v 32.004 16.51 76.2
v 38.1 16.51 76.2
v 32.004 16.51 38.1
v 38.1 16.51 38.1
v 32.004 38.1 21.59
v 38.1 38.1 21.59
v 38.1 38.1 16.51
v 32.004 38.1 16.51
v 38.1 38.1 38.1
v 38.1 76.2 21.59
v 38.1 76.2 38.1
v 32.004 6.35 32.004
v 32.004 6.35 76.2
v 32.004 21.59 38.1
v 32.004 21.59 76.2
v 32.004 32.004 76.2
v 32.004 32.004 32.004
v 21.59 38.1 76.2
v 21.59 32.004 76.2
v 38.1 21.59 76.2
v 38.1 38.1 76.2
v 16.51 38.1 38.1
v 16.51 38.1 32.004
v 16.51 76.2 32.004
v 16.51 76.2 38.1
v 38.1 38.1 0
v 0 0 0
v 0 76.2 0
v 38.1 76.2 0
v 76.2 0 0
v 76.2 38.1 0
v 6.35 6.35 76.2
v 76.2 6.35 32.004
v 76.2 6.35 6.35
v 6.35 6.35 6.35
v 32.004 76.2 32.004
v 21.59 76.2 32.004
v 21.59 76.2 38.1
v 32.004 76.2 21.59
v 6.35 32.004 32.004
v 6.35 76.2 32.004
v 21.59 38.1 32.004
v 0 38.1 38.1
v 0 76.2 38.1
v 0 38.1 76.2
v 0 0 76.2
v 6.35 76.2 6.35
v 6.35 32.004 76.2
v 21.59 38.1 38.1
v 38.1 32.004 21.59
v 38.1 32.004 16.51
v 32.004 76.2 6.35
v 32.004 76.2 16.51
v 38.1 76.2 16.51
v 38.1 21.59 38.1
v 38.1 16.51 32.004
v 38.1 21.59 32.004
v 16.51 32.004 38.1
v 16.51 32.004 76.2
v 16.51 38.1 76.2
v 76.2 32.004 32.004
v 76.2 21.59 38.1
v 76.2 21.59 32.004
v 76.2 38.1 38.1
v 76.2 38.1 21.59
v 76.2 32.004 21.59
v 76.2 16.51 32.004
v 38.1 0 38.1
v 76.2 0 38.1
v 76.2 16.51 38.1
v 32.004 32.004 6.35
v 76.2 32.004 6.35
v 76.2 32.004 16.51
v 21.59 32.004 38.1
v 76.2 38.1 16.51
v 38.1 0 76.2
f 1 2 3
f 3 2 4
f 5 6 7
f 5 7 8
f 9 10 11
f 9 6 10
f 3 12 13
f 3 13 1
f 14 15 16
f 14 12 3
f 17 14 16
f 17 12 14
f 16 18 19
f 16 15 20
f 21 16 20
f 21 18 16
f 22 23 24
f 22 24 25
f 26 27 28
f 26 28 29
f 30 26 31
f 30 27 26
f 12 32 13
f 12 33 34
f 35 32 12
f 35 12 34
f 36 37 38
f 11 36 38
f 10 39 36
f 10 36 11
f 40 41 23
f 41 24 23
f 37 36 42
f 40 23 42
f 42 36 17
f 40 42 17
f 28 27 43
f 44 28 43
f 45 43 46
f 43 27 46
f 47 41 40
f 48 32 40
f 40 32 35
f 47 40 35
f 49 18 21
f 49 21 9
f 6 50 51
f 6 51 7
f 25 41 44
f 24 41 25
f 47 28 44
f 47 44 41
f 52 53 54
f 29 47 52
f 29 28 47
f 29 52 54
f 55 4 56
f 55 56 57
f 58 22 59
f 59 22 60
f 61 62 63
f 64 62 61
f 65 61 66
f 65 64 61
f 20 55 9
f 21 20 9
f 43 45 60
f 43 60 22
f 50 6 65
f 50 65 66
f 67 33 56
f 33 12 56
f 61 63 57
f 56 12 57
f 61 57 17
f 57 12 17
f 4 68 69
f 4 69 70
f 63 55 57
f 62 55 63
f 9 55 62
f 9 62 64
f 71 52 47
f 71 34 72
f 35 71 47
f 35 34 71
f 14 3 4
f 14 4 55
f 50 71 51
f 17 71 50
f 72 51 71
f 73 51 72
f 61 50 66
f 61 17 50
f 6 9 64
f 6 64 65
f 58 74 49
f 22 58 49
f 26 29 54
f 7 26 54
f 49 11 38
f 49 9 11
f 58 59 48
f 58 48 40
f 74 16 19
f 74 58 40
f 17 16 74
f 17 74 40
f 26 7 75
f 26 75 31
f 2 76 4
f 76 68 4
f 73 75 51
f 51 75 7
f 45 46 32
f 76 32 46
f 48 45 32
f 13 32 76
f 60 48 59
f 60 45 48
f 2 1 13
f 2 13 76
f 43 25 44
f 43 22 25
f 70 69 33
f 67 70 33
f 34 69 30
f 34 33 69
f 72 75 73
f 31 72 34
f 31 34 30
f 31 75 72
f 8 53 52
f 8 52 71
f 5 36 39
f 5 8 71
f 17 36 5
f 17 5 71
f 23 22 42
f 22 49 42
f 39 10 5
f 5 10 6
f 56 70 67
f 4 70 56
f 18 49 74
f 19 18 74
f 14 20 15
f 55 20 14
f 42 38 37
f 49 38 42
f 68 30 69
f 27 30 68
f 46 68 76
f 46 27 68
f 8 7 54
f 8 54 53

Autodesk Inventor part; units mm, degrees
ref_plane "YZ Plane" through (0, 0, 0) normal (1, 0, 0) x (0, 1, 0)
ref_plane "XZ Plane" through (0, 0, 0) normal (0, 1, 0) x (-1, 0, 0)
ref_plane "XY Plane" through (0, 0, 0) normal (0, 0, 1) x (1, 0, 0)
sketch "Sketch1" plane through (0, 0, 0) normal (0, 0, 1) x (1, 0, 0)
  line L0 (0, 0) -> (38.1, 0)
  line L1 (38.1, 0) -> (38.1, 38.1)
  line L2 (38.1, 38.1) -> (0, 38.1)
  line L3 (0, 38.1) -> (0, 0)
  dimension "d0" = 38.1
  dimension "d1" = 38.1
extrude "Extrusion1" add sketch "Sketch1" along normal blind 38.1
sketch "Sketch2" plane through (0, 0, 38.1) normal (0, 0, 1) x (1, 0, 0)
  line L0 (6.35, 6.35) -> (32.004, 6.35)
  line L1 (32.004, 6.35) -> (32.004, 32.004)
  line L2 (32.004, 32.004) -> (6.35, 32.004)
  line L3 (6.35, 32.004) -> (6.35, 6.35)
  line L4 (38.1, 0) -> (38.1, 38.1) projected
  line L5 (0, 0) -> (38.1, 0)
  line L6 (38.1, 0) -> (38.1, 38.1)
  line L7 (38.1, 38.1) -> (0, 38.1)
  line L8 (0, 38.1) -> (0, 0)
  dimension "d4" = 25.654
  dimension "d5" = 25.654
extrude "Extrusion2" cut sketch "Sketch2" against normal blind 31.75 contours L3 L2 L1 L0
sketch "Sketch3" plane through (38.1, 0, 0) normal (1, 0, 0) x (0, 0, -1)
  point P0 (0, 0)
sketch "Sketch5" plane through (0, 0, 38.1) normal (0, 0, 1) x (1, 0, 0)
  line L0 (6.35, 6.35) -> (6.35, 32.004) projected
  line L1 (6.35, 6.35) -> (32.004, 6.35)
  line L2 (32.004, 6.35) -> (32.004, 32.004)
  line L3 (32.004, 32.004) -> (6.35, 32.004)
  line L4 (6.35, 32.004) -> (6.35, 6.35)
  line L5 (0, 0) -> (38.1, 0) projected
  line L6 (0, 0) -> (38.1, 0)
  line L7 (38.1, 0) -> (38.1, 38.1)
  line L8 (38.1, 38.1) -> (0, 38.1)
  line L9 (0, 38.1) -> (0, 0)
extrude "Extrusion4" add sketch "Sketch5" along normal blind 38.1
sketch "Sketch7" plane through (38.1, 0, 0) normal (1, 0, 0) x (0, 0, -1)
  line L0 (0, 0) -> (-76.2, 0) projected
  line L1 (0, 0) -> (-38.1, 0)
  line L2 (-38.1, 0) -> (-38.1, 38.1)
  line L3 (-38.1, 38.1) -> (0, 38.1)
  line L4 (0, 38.1) -> (0, 0)
  line L5 (-76.2, 6.35) -> (-6.35, 6.35) projected
  line L6 (-6.35, 6.35) -> (-32.004, 6.35)
  line L7 (-32.004, 6.35) -> (-32.004, 32.004)
  line L8 (-32.004, 32.004) -> (-6.35, 32.004)
  line L9 (-6.35, 32.004) -> (-6.35, 6.35)
  dimension "d16" = 38.1
  dimension "d17" = 38.1
  dimension "d20" = 25.654
  dimension "d21" = 25.654
extrude "Extrusion6" add sketch "Sketch7" along normal blind 38.1
sketch "Sketch9" plane through (38.1, 6.35, 6.35) normal (1, 0, 0) x (0, 0, -1)
  line L0 (-25.654, 0) -> (-25.654, 25.654) projected
  line L1 (0, 0) -> (0, 25.654) projected
  line L2 (-25.654, 0) -> (0, 0)
  line L3 (0, 0) -> (0, 25.654)
  line L4 (0, 25.654) -> (-25.654, 25.654)
  line L5 (-25.654, 25.654) -> (-25.654, 0)
  point P0 (6.35, -6.35)
extrude "Extrusion7" cut sketch "Sketch9" against normal blind 31.75
sketch "Sketch10" plane through (0, 38.1, 76.2) normal (0, 1, 0) x (1, 0, 0)
  line L0 (76.2, 69.85) -> (6.35, 69.85) projected
  line L1 (6.35, 69.85) -> (32.004, 69.85)
  line L2 (32.004, 69.85) -> (32.004, 44.196)
  line L3 (32.004, 44.196) -> (6.35, 44.196)
  line L4 (6.35, 44.196) -> (6.35, 69.85)
  line L5 (38.1, 38.1) -> (38.1, 0) projected
  line L6 (0, 76.2) -> (0, 0) projected
  line L7 (38.1, 38.1) -> (0, 38.1)
  line L8 (0, 38.1) -> (0, 76.2)
  line L9 (0, 76.2) -> (38.1, 76.2)
  line L10 (38.1, 76.2) -> (38.1, 38.1)
  point P0 (0, 38.1)
  dimension "d26" = 25.654
  dimension "d27" = 25.654
extrude "Extrusion8" add sketch "Sketch10" along normal blind 38.1
sketch "Sketch11" plane through (6.35, 38.1, 6.35) normal (0, 1, 0) x (1, 0, 0)
  line L0 (0, -25.654) -> (25.654, -25.654) projected
  line L1 (25.654, -25.654) -> (0, -25.654)
  line L2 (0, -25.654) -> (0, 0)
  line L3 (0, 0) -> (25.654, 0)
  line L4 (25.654, 0) -> (25.654, -25.654)
  point P0 (-6.35, 6.35)
extrude "Extrusion9" cut sketch "Sketch11" against normal blind 6.35
sketch "Sketch12" plane through (0, 76.2, 76.2) normal (0, 1, 0) x (1, 0, 0)
  line L0 (38.1, 55.88) -> (32.004, 55.88)
  line L1 (32.004, 55.88) -> (32.004, 58.42)
  line L2 (32.004, 58.42) -> (38.1, 58.42)
  line L3 (38.1, 58.42) -> (38.1, 55.88)
  point P0 (0, 76.2)
  dimension "d32" = 6.096
  dimension "d33" = 2.54
extrude "Extrusion10" cut sketch "Sketch12" against normal blind 38.1
sketch "Sketch13" plane through (76.2, 38.1, 38.1) normal (0, 1, 0) x (1, 0, 0)
  line L0 (0, 31.75) -> (0, 6.096) projected
  line L1 (-44.196, 17.78) -> (0, 17.78)
  line L2 (0, 17.78) -> (0, 20.32)
  line L3 (0, 20.32) -> (-44.196, 20.32)
  line L4 (-44.196, 20.32) -> (-44.196, 17.78)
  point P0 (-76.2, 38.1)
  dimension "d36" = 2.54
extrude "Extrusion11" cut sketch "Sketch13" against normal blind 6.35
sketch "Sketch15" plane through (0, 76.2, 76.2) normal (0, 1, 0) x (1, 0, 0)
  line L0 (17.78, 38.1) -> (20.32, 38.1)
  line L1 (20.32, 38.1) -> (20.32, 44.196)
  line L2 (20.32, 44.196) -> (17.78, 44.196)
  line L3 (17.78, 44.196) -> (17.78, 38.1)
  point P0 (0, 76.2)
  dimension "d39" = 2.54
  dimension "d40" = 6.096
extrude "Extrusion12" cut sketch "Sketch15" against normal blind 38.1
sketch "Sketch16" plane through (0, 38.1, 76.2) normal (0, 1, 0) x (1, 0, 0)
  line L0 (20.32, 44.196) -> (20.32, 38.1) projected
  line L1 (0, 0) -> (38.1, 0) projected
  line L2 (20.32, 44.196) -> (17.78, 44.196)
  line L3 (17.78, 44.196) -> (17.78, 0)
  line L4 (17.78, 0) -> (20.32, 0)
  line L5 (20.32, 0) -> (20.32, 44.196)
  point P0 (0, 76.2)
  dimension "d43" = 2.54
extrude "Extrusion13" cut sketch "Sketch16" against normal blind 6.35
sketch "Sketch17" plane through (38.1, 0, 76.2) normal (1, 0, 0) x (0, 0, -1)
  line L0 (38.1, 0) -> (38.1, 38.1) projected
  line L1 (0, 17.78) -> (38.1, 17.78)
  line L2 (38.1, 17.78) -> (38.1, 20.32)
  line L3 (38.1, 20.32) -> (0, 20.32)
  line L4 (0, 20.32) -> (0, 17.78)
  point P0 (76.2, 0)
  dimension "d46" = 2.54
extrude "Extrusion14" cut sketch "Sketch17" against normal blind 6.35
sketch "Sketch18" plane through (38.1, 0, 38.1) normal (0, 0, 1) x (1, 0, 0)
  line L0 (0, 17.78) -> (38.1, 17.78)
  line L1 (38.1, 17.78) -> (38.1, 20.32)
  line L2 (38.1, 20.32) -> (0, 20.32)
  line L3 (0, 20.32) -> (0, 17.78)
  point P0 (-38.1, 0)
  dimension "d49" = 38.1
  dimension "d50" = 2.54
extrude "Extrusion15" cut sketch "Sketch18" against normal blind 6.35
sketch "Sketch20" plane through (38.1, 38.1, 38.1) normal (0, 0, 1) x (1, 0, 0)
  line L0 (-17.78, -6.096) -> (-17.78, 38.1) projected
  line L1 (0, 0) -> (-17.78, 0) projected
  line L2 (-17.78, 38.1) -> (-16.51, 38.1)
  line L3 (-16.51, 38.1) -> (-16.51, 0)
  line L4 (-16.51, 0) -> (-17.78, 0)
  line L5 (-17.78, 0) -> (-17.78, 38.1)
  point P0 (-38.1, -38.1)
  dimension "d53" = 1.27
extrude "Extrusion16" cut sketch "Sketch20" against normal blind 6.35
sketch "Sketch21" plane through (38.1, 38.1, 76.2) normal (0, 1, 0) x (1, 0, 0)
  line L0 (-17.78, 0) -> (-17.78, 44.196) projected
  line L1 (0, 0) -> (-17.78, 0) projected
  line L2 (-17.78, 44.196) -> (-16.51, 44.196)
  line L3 (-16.51, 44.196) -> (-16.51, 0)
  line L4 (-16.51, 0) -> (-17.78, 0)
  line L5 (-17.78, 0) -> (-17.78, 44.196)
  point P0 (-38.1, 76.2)
  dimension "d56" = 1.27
extrude "Extrusion17" cut sketch "Sketch21" against normal blind 6.35
sketch "Sketch23" plane through (0, 38.1, 38.1) normal (0, 0, 1) x (1, 0, 0)
  line L0 (17.78, 0) -> (17.78, 38.1) projected
  line L1 (17.78, 0) -> (0, 0) projected
  line L2 (17.78, 38.1) -> (16.51, 38.1)
  line L3 (16.51, 38.1) -> (16.51, 0)
  line L4 (16.51, 0) -> (17.78, 0)
  line L5 (17.78, 0) -> (17.78, 38.1)
  point P0 (0, -38.1)
  dimension "d59" = 1.27
extrude "Extrusion18" cut sketch "Sketch23" against normal blind 6.35
sketch "Sketch24" plane through (0, 38.1, 76.2) normal (0, 1, 0) x (1, 0, 0)
  line L0 (17.78, 44.196) -> (17.78, 0) projected
  line L1 (17.78, 0) -> (0, 0) projected
  line L2 (17.78, 44.196) -> (16.51, 44.196)
  line L3 (16.51, 44.196) -> (16.51, 0)
  line L4 (16.51, 0) -> (17.78, 0)
  line L5 (17.78, 0) -> (17.78, 44.196)
  point P0 (0, 76.2)
  dimension "d62" = 1.27
extrude "Extrusion19" cut sketch "Sketch24" against normal blind 6.35
sketch "Sketch25" plane through (38.1, 0, 76.2) normal (1, 0, 0) x (0, 0, -1)
  line L0 (38.1, 0) -> (38.1, 17.78) projected
  line L1 (38.1, 17.78) -> (0, 17.78)
  line L2 (0, 17.78) -> (0, 16.51)
  line L3 (0, 16.51) -> (38.1, 16.51)
  line L4 (38.1, 16.51) -> (38.1, 17.78)
  point P0 (76.2, 0)
  dimension "d65" = 38.1
  dimension "d66" = 1.27
extrude "Extrusion20" cut sketch "Sketch25" against normal blind 6.35
sketch "Sketch26" plane through (38.1, 38.1, 76.2) normal (1, 0, 0) x (0, 0, -1)
  line L0 (0, -17.78) -> (38.1, -17.78) projected
  line L1 (38.1, -17.78) -> (0, -17.78)
  line L2 (0, -17.78) -> (0, -16.51)
  line L3 (0, -16.51) -> (38.1, -16.51)
  line L4 (38.1, -16.51) -> (38.1, -17.78)
  point P0 (76.2, -38.1)
  dimension "d69" = 38.1
  dimension "d70" = 1.27
extrude "Extrusion21" cut sketch "Sketch26" against normal blind 6.35
sketch "Sketch27" plane through (38.1, 0, 38.1) normal (0, 0, 1) x (1, 0, 0)
  line L0 (0, 21.59) -> (0, 38.1) projected
  line L1 (0, 20.32) -> (38.1, 20.32) projected
  line L2 (0, 21.59) -> (38.1, 21.59)
  line L3 (38.1, 21.59) -> (38.1, 20.32)
  line L4 (38.1, 20.32) -> (0, 20.32)
  line L5 (0, 20.32) -> (0, 21.59)
  line L6 (38.1, 17.78) -> (0, 17.78) projected
  line L7 (0, 17.78) -> (38.1, 17.78)
  line L8 (38.1, 17.78) -> (38.1, 16.51)
  line L9 (38.1, 16.51) -> (0, 16.51)
  line L10 (0, 16.51) -> (0, 17.78)
  point P0 (-38.1, 0)
  dimension "d73" = 38.1
  dimension "d74" = 1.27
extrude "Extrusion22" cut sketch "Sketch27" against normal blind 6.35
sketch "Sketch28" plane through (38.1, 38.1, 38.1) normal (0, 1, 0) x (1, 0, 0)
  line L0 (0, 20.32) -> (38.1, 20.32) projected
  line L1 (0, 20.32) -> (38.1, 20.32)
  line L2 (38.1, 20.32) -> (38.1, 21.59)
  line L3 (38.1, 21.59) -> (0, 21.59)
  line L4 (0, 21.59) -> (0, 20.32)
  line L5 (-6.096, 17.78) -> (38.1, 17.78) projected
  line L6 (38.1, 17.78) -> (0, 17.78)
  line L7 (0, 17.78) -> (0, 16.51)
  line L8 (0, 16.51) -> (38.1, 16.51)
  line L9 (38.1, 16.51) -> (38.1, 17.78)
  point P0 (-38.1, 38.1)
  point P1 (0, 17.78)
  dimension "d77" = 38.1
  dimension "d78" = 1.27
  dimension "d79" = 38.1
  dimension "d80" = 1.27
extrude "Extrusion23" cut sketch "Sketch28" against normal blind 6.35
sketch "Sketch29" plane through (38.1, 38.1, 0) normal (1, 0, 0) x (0, 0, -1)
  line L0 (-17.78, -6.096) -> (-6.35, -6.096) projected
  line L1 (-6.35, 38.1) -> (-17.78, 38.1) projected
  line L2 (-17.78, -6.096) -> (-16.51, -6.096)
  line L3 (-16.51, -6.096) -> (-16.51, 38.1)
  line L4 (-16.51, 38.1) -> (-17.78, 38.1)
  line L5 (-17.78, 38.1) -> (-17.78, -6.096)
  line L6 (-21.59, 0) -> (-21.59, -6.096) projected
  line L7 (-20.32, 38.1) -> (-20.32, -6.096) projected
  line L8 (-21.59, -6.096) -> (-20.32, -6.096)
  line L9 (-20.32, -6.096) -> (-20.32, 38.1)
  line L10 (-20.32, 38.1) -> (-21.59, 38.1)
  line L11 (-21.59, 38.1) -> (-21.59, -6.096)
  point P0 (0, -38.1)
  point P1 (-20.32, -6.096)
  dimension "d83" = 1.27
extrude "Extrusion24" cut sketch "Sketch29" against normal blind 6.35
sketch "Sketch30" plane through (76.2, 38.1, 21.59) normal (0, 0, -1) x (-1, 0, 0)
  line L0 (0, 0) -> (38.1, 0) projected
  line L1 (44.196, 38.1) -> (44.196, -6.096) projected
  line L2 (38.1, 0) -> (44.196, 0)
  line L3 (44.196, 0) -> (44.196, -6.096)
  line L4 (44.196, -6.096) -> (38.1, -6.096)
  line L5 (38.1, -6.096) -> (38.1, 0)
  point P0 (76.2, -38.1)
  point P1 (44.196, 0)
extrude "Extrusion25" add sketch "Sketch30" along normal blind 5.08
sketch "Sketch31" plane through (21.59, 38.1, 38.1) normal (-1, 0, 0) x (0, 0, 1)
  line L0 (38.1, -6.096) -> (-6.096, -6.096) projected
  line L1 (0, 0) -> (-6.096, 0)
  line L2 (-6.096, 0) -> (-6.096, -6.096)
  line L3 (-6.096, -6.096) -> (0, -6.096)
  line L4 (0, -6.096) -> (0, 0)
  point P0 (-38.1, -38.1)
extrude "Extrusion26" add sketch "Sketch31" along normal blind 5.08
properties part number "corner connector"
